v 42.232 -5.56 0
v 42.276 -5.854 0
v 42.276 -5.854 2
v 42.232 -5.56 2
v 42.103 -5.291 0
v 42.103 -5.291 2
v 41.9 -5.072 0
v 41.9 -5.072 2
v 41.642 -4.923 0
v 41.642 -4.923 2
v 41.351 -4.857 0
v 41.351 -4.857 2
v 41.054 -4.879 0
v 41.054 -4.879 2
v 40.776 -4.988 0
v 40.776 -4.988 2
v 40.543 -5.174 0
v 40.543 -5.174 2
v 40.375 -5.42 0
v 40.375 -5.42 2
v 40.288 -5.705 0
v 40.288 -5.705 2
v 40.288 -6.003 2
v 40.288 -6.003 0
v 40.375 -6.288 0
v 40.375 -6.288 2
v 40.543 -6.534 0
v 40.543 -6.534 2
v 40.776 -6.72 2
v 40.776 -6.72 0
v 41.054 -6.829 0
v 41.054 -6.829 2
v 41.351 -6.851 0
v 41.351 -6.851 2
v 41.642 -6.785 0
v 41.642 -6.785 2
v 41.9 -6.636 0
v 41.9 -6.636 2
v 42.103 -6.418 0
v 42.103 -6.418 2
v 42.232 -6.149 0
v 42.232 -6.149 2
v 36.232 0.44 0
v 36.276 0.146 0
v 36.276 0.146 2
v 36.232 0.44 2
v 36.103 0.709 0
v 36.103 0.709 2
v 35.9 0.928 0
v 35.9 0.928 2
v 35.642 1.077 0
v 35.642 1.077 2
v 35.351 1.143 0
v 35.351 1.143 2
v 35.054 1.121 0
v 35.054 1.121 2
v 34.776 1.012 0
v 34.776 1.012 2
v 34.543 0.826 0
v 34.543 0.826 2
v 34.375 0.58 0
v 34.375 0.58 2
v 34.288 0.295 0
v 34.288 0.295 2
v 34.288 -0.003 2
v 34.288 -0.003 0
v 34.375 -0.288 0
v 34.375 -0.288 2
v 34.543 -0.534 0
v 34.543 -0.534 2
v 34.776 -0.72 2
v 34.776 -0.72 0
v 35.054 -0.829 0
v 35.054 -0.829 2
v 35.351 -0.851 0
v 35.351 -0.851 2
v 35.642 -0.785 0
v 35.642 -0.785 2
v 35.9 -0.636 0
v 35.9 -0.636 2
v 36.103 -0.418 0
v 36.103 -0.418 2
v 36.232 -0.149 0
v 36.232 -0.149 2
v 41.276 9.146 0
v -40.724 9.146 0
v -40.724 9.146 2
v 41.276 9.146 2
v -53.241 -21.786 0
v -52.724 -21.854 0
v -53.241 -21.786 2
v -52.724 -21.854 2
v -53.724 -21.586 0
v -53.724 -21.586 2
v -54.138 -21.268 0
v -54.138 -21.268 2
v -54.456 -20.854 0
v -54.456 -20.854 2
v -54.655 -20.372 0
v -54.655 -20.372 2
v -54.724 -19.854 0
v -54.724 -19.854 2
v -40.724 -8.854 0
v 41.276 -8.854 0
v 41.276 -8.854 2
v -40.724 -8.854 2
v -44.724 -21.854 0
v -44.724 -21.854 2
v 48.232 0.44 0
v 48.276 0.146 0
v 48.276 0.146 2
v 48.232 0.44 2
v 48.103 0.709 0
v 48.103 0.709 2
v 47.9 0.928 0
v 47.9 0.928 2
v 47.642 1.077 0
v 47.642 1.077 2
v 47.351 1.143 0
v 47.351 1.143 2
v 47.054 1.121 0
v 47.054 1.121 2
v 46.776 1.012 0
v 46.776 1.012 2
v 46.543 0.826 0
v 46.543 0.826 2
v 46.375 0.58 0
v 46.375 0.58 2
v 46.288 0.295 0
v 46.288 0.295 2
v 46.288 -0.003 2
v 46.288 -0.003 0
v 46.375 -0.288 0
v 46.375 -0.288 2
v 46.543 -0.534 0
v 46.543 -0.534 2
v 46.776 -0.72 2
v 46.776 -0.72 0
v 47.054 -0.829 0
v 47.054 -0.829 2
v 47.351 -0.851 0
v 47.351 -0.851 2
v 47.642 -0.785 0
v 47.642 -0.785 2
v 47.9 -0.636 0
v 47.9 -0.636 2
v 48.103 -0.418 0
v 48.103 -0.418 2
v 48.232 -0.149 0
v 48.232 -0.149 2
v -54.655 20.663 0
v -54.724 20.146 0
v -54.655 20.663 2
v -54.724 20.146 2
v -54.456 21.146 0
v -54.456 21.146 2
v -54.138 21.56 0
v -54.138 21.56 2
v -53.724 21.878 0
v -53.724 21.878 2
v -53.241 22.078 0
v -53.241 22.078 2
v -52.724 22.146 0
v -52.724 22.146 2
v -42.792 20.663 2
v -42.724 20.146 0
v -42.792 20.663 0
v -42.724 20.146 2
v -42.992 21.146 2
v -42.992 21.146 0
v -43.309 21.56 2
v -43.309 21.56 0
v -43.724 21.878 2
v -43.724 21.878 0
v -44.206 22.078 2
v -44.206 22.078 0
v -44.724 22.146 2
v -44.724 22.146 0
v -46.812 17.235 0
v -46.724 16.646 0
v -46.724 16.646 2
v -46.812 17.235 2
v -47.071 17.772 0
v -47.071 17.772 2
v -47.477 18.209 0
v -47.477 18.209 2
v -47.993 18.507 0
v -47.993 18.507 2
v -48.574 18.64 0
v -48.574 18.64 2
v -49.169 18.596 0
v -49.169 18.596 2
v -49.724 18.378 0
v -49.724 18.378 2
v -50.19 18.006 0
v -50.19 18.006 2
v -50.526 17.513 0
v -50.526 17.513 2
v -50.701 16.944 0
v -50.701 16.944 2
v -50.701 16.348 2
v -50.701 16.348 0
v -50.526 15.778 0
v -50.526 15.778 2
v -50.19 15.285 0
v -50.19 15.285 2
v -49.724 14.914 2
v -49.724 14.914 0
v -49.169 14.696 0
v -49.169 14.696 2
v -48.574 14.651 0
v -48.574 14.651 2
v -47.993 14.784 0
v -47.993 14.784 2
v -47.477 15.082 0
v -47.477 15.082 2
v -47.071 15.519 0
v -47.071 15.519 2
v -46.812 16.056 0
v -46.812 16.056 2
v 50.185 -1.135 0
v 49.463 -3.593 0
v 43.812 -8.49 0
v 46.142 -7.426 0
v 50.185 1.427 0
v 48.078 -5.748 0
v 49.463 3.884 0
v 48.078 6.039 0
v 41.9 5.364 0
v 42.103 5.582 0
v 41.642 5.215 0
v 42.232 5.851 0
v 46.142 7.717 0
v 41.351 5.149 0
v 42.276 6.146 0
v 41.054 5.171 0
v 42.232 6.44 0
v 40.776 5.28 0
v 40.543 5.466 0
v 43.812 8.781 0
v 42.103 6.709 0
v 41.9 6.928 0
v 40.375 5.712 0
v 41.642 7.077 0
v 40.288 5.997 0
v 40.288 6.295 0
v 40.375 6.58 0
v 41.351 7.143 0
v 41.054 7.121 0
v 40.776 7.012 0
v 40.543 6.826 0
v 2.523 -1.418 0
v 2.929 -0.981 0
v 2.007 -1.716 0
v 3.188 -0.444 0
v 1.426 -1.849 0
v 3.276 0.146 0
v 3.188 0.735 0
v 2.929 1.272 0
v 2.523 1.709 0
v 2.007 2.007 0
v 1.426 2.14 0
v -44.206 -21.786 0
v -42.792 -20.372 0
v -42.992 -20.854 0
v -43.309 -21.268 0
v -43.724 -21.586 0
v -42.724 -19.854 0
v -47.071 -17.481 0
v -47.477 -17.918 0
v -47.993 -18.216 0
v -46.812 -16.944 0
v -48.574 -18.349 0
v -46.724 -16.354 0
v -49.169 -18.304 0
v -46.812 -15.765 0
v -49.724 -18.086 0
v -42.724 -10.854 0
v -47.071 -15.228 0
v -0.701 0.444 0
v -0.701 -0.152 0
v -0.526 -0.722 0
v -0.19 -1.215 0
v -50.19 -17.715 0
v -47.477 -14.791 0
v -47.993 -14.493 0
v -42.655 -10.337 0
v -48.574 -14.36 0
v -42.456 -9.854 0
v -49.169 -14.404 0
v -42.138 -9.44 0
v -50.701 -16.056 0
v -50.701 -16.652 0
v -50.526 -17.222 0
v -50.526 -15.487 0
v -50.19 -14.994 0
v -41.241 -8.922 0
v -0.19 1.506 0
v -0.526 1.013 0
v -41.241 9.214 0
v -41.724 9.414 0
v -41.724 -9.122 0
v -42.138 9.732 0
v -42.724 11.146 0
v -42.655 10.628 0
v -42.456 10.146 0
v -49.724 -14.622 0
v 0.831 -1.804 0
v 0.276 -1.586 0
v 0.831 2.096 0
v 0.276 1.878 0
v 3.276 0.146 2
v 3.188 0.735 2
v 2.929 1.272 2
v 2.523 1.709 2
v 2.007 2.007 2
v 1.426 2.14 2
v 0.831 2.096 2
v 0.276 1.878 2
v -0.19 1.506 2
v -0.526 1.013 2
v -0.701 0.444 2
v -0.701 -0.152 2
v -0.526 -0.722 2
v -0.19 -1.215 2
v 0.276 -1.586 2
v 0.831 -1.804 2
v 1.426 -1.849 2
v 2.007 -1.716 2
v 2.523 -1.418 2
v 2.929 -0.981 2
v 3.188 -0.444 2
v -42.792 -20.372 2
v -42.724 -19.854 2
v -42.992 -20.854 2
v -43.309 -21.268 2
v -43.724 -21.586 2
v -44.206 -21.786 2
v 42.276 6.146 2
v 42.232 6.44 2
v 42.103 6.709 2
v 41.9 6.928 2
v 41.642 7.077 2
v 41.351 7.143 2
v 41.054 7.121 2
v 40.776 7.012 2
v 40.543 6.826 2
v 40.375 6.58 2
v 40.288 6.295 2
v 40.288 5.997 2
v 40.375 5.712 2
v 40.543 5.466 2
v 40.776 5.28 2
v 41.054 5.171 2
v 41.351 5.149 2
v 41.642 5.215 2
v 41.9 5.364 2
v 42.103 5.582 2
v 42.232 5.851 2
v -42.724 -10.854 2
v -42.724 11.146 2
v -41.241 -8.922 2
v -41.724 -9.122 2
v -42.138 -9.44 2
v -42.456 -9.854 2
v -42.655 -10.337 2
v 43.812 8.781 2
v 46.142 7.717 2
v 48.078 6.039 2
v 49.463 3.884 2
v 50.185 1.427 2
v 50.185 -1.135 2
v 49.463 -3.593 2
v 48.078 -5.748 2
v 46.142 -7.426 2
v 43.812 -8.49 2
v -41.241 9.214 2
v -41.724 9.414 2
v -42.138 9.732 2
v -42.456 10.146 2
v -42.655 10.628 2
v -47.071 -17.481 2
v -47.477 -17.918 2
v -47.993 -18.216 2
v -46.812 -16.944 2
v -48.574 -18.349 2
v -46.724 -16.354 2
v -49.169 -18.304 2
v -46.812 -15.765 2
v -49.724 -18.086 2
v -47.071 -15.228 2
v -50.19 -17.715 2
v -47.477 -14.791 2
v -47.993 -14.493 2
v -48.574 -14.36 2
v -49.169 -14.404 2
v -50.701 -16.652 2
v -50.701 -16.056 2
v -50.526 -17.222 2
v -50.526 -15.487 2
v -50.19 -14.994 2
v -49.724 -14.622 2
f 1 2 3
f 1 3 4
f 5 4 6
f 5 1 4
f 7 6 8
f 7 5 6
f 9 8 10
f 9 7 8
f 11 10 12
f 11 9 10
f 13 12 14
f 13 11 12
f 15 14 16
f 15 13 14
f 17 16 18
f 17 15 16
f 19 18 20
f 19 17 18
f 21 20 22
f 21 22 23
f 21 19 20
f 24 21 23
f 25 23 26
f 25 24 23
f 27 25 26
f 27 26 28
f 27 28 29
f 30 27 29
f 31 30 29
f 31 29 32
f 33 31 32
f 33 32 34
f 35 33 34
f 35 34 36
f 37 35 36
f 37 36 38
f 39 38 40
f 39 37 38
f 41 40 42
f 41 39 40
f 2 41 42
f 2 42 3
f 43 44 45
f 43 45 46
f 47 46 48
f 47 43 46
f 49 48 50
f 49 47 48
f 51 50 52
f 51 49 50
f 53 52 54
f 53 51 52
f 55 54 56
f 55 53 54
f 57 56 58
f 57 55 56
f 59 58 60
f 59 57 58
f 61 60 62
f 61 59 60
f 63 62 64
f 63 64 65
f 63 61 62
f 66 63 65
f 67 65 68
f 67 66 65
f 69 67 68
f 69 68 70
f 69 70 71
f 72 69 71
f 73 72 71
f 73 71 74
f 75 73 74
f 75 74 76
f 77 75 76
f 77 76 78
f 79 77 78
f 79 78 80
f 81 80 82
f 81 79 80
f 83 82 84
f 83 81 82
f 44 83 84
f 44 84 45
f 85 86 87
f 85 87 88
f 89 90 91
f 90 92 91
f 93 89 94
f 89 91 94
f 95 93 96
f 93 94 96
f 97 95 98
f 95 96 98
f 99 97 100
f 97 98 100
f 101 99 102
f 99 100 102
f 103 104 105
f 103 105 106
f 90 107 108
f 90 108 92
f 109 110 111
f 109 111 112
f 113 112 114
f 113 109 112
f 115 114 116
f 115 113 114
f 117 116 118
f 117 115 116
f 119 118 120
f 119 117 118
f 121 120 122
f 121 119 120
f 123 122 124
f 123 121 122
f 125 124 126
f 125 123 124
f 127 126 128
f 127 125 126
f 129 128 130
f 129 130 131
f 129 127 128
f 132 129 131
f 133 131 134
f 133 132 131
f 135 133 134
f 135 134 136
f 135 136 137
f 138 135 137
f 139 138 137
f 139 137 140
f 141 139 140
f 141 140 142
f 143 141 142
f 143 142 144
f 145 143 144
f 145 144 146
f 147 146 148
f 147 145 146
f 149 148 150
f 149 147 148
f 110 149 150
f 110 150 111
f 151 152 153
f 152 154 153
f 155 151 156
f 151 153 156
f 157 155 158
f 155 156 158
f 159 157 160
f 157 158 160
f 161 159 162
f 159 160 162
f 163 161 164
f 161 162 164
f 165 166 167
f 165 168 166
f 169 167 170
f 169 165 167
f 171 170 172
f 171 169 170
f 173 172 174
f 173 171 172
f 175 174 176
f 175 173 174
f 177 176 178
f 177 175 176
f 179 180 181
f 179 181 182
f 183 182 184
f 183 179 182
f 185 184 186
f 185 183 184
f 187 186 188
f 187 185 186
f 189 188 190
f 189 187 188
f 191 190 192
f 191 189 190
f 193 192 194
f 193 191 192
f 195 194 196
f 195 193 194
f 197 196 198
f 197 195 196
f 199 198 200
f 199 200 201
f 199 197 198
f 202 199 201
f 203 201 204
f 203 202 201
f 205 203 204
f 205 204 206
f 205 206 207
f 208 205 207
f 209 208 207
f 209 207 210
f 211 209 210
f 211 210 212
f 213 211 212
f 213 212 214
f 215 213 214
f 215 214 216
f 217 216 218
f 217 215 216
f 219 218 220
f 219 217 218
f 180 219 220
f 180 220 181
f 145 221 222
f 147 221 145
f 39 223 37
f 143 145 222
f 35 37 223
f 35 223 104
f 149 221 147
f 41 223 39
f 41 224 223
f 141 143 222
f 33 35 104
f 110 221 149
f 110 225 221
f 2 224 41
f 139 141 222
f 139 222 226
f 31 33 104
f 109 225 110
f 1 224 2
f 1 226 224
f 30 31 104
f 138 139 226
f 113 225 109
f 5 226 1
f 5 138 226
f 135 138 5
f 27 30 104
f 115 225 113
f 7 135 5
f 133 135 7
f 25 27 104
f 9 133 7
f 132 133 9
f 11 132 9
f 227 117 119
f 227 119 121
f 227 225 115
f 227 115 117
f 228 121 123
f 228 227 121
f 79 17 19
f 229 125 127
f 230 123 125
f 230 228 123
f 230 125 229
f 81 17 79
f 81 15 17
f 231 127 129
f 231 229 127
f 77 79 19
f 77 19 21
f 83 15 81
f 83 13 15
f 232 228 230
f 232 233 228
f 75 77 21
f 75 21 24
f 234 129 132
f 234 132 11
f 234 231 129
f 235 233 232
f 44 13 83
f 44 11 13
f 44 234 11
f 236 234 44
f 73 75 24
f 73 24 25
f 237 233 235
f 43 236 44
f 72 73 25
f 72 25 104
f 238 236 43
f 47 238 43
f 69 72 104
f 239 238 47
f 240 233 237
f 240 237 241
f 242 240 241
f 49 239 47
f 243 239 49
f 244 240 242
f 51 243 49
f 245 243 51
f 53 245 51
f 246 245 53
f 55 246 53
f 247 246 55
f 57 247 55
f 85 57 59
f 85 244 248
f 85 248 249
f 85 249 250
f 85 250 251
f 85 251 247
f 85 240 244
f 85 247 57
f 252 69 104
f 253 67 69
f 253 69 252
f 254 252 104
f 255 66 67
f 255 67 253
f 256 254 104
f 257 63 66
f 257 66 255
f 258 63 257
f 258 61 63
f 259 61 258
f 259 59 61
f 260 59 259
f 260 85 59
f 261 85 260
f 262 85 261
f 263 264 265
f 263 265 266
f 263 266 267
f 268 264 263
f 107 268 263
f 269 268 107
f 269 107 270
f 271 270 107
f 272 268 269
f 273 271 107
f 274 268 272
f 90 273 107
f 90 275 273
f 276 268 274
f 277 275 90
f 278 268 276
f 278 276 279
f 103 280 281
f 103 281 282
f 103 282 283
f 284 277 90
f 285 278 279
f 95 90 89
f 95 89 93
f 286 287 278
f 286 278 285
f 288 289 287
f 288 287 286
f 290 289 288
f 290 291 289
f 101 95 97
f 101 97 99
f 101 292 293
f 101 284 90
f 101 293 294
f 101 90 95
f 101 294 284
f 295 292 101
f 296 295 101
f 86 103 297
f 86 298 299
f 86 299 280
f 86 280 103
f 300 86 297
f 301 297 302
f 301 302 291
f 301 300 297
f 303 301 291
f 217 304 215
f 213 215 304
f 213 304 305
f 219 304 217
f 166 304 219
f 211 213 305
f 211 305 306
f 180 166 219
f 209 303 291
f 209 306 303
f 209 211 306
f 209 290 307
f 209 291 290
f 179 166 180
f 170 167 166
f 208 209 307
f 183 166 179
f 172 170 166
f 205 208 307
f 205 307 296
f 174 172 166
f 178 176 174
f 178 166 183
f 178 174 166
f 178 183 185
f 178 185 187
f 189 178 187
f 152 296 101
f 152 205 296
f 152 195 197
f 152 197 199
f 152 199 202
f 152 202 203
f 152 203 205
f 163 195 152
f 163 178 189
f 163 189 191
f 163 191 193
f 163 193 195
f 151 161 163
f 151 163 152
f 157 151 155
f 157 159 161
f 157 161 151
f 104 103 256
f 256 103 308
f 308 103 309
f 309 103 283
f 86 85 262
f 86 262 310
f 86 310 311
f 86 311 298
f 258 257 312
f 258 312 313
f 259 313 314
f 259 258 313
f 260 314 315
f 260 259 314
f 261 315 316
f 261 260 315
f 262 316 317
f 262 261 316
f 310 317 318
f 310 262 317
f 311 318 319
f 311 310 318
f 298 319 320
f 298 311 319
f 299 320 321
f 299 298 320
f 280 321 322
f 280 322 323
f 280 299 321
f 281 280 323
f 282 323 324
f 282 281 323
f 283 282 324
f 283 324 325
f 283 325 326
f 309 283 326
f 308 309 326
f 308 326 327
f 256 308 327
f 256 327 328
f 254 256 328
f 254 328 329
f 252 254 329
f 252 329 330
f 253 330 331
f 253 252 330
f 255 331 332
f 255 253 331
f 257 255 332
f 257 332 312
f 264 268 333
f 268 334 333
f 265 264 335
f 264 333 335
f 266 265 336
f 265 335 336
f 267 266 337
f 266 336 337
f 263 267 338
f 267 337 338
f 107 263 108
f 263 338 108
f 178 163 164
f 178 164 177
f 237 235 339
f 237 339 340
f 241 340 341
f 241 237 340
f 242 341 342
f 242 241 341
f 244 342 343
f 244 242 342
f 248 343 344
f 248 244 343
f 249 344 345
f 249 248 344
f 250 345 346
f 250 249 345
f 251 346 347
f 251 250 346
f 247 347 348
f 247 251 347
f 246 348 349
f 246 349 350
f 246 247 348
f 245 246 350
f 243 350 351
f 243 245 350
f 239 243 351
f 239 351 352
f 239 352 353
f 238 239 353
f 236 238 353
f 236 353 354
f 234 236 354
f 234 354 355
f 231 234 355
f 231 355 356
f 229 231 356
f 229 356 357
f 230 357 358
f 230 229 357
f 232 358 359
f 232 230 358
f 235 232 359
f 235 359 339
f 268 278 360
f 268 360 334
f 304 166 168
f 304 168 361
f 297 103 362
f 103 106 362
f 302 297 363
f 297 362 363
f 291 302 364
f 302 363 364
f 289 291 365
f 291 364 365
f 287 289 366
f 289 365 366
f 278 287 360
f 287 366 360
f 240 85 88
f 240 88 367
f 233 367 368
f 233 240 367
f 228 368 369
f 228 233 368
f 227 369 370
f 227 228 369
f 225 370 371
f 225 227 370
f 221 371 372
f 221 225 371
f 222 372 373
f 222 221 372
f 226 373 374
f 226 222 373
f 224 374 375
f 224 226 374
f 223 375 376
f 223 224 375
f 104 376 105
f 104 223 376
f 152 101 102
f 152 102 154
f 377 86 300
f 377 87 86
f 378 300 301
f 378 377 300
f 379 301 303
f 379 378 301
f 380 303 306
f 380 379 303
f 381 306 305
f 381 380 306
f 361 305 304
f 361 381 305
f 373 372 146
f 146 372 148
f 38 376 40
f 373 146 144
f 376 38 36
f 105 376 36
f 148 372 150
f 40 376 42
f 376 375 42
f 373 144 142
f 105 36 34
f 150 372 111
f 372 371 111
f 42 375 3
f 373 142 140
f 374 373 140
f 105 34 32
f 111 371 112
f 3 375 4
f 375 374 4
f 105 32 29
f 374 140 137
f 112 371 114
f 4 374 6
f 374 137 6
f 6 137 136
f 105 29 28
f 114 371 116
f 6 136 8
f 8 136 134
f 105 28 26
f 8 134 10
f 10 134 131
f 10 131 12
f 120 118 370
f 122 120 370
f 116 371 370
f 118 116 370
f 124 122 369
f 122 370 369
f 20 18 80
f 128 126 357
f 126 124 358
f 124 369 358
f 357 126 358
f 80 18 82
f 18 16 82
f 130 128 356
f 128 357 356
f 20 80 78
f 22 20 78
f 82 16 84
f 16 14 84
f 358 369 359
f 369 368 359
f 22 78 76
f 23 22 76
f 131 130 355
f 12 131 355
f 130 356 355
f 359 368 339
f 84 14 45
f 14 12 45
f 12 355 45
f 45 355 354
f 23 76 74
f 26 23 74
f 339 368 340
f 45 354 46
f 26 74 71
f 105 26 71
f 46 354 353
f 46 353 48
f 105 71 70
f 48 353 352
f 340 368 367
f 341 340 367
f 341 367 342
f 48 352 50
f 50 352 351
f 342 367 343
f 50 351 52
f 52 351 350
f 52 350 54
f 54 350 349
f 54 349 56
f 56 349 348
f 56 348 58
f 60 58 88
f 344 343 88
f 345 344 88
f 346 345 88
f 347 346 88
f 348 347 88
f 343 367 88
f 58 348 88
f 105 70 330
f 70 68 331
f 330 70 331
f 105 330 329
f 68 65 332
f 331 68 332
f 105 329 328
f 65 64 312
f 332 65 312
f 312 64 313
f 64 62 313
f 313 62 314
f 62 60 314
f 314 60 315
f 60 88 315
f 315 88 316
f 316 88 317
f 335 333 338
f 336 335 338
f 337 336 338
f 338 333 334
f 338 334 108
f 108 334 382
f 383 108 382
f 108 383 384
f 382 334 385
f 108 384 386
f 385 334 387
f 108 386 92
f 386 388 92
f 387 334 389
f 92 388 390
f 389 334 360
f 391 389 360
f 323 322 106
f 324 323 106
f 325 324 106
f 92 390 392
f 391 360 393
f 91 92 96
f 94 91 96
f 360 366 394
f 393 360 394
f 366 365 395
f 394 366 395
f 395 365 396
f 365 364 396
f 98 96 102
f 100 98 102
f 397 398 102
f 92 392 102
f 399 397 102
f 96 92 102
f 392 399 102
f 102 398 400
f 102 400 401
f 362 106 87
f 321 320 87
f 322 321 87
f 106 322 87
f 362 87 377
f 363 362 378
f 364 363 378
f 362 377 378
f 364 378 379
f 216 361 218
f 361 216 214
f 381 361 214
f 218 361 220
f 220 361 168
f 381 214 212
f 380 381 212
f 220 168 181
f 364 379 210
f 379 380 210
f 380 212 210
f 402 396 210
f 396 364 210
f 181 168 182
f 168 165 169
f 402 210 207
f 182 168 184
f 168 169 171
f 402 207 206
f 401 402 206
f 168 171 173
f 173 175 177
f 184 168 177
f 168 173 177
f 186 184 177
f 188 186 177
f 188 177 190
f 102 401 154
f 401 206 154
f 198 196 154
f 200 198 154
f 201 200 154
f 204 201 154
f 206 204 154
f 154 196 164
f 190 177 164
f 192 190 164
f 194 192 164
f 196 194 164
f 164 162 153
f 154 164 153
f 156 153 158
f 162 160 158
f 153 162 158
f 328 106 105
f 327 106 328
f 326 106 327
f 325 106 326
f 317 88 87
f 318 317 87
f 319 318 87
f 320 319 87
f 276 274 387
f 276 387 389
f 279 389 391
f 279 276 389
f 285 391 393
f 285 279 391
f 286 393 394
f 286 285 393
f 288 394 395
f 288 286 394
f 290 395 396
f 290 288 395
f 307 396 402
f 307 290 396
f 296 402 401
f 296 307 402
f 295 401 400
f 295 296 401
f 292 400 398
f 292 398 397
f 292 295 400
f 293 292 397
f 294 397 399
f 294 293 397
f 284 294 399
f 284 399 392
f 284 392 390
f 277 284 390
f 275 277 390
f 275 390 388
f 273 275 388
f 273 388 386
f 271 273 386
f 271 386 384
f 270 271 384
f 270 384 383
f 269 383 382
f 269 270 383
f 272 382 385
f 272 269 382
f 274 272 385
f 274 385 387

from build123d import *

# Parameters (mm, degrees)
SKETCH_1_R      = 2
SKETCH_1_R_2    = 1
EXTRUDE_1_DEPTH = 2
FILLET_1_R      = 2


with BuildPart() as part:
    # 草图1 → 凸台-拉伸1 (new body)
    with BuildSketch(Plane.XY):
        with BuildLine():
            Line((41.276428571, -8.854285714), (-42.723571429, -8.854285714))
            Line((-42.723571429, -8.854285714), (-42.723571429, -21.854285714))
            Line((-42.723571429, -21.854285714), (-54.723571429, -21.854285714))
            Line((-54.723571429, -21.854285714), (-54.723571429, 22.145714286))
            Line((-54.723571429, 22.145714286), (-42.723571429, 22.145714286))
            Line((-42.723571429, 22.145714286), (-42.723571429, 9.145714286))
            Line((-42.723571429, 9.145714286), (41.276428571, 9.145714286))
            ThreePointArc((41.276428571, 9.145714286), (50.276428571, 0.145714286), (41.276428571, -8.854285714))
        make_face()
        with Locations((1.276428571, 0.145714286)):
            Circle(SKETCH_1_R, mode=Mode.SUBTRACT)
        with Locations((-48.723571429, 16.645714286)):
            Circle(SKETCH_1_R, mode=Mode.SUBTRACT)
        with Locations((-48.723571429, -16.354285714)):
            Circle(SKETCH_1_R, mode=Mode.SUBTRACT)
        with Locations((41.276428571, 6.145714286)):
            Circle(SKETCH_1_R_2, mode=Mode.SUBTRACT)
        with Locations((47.276428571, 0.145714286)):
            Circle(SKETCH_1_R_2, mode=Mode.SUBTRACT)
        with Locations((41.276428571, -5.854285714)):
            Circle(SKETCH_1_R_2, mode=Mode.SUBTRACT)
        with Locations((35.276428571, 0.145714286)):
            Circle(SKETCH_1_R_2, mode=Mode.SUBTRACT)
    extrude(amount=EXTRUDE_1_DEPTH)

    # 圆角1
    fillet_1_edges = [part.edges().sort_by_distance(p)[0] for p in [
        (-42.723571429, -8.854285714, 1),
        (-42.723571429, -21.854285714, 1),
        (-54.723571429, -21.854285714, 1),
        (-54.723571429, 22.145714286, 1),
        (-42.723571429, 22.145714286, 1),
        (-42.723571429, 9.145714286, 1),
    ]]
    fillet(fillet_1_edges, radius=FILLET_1_R)


solid = part.part
